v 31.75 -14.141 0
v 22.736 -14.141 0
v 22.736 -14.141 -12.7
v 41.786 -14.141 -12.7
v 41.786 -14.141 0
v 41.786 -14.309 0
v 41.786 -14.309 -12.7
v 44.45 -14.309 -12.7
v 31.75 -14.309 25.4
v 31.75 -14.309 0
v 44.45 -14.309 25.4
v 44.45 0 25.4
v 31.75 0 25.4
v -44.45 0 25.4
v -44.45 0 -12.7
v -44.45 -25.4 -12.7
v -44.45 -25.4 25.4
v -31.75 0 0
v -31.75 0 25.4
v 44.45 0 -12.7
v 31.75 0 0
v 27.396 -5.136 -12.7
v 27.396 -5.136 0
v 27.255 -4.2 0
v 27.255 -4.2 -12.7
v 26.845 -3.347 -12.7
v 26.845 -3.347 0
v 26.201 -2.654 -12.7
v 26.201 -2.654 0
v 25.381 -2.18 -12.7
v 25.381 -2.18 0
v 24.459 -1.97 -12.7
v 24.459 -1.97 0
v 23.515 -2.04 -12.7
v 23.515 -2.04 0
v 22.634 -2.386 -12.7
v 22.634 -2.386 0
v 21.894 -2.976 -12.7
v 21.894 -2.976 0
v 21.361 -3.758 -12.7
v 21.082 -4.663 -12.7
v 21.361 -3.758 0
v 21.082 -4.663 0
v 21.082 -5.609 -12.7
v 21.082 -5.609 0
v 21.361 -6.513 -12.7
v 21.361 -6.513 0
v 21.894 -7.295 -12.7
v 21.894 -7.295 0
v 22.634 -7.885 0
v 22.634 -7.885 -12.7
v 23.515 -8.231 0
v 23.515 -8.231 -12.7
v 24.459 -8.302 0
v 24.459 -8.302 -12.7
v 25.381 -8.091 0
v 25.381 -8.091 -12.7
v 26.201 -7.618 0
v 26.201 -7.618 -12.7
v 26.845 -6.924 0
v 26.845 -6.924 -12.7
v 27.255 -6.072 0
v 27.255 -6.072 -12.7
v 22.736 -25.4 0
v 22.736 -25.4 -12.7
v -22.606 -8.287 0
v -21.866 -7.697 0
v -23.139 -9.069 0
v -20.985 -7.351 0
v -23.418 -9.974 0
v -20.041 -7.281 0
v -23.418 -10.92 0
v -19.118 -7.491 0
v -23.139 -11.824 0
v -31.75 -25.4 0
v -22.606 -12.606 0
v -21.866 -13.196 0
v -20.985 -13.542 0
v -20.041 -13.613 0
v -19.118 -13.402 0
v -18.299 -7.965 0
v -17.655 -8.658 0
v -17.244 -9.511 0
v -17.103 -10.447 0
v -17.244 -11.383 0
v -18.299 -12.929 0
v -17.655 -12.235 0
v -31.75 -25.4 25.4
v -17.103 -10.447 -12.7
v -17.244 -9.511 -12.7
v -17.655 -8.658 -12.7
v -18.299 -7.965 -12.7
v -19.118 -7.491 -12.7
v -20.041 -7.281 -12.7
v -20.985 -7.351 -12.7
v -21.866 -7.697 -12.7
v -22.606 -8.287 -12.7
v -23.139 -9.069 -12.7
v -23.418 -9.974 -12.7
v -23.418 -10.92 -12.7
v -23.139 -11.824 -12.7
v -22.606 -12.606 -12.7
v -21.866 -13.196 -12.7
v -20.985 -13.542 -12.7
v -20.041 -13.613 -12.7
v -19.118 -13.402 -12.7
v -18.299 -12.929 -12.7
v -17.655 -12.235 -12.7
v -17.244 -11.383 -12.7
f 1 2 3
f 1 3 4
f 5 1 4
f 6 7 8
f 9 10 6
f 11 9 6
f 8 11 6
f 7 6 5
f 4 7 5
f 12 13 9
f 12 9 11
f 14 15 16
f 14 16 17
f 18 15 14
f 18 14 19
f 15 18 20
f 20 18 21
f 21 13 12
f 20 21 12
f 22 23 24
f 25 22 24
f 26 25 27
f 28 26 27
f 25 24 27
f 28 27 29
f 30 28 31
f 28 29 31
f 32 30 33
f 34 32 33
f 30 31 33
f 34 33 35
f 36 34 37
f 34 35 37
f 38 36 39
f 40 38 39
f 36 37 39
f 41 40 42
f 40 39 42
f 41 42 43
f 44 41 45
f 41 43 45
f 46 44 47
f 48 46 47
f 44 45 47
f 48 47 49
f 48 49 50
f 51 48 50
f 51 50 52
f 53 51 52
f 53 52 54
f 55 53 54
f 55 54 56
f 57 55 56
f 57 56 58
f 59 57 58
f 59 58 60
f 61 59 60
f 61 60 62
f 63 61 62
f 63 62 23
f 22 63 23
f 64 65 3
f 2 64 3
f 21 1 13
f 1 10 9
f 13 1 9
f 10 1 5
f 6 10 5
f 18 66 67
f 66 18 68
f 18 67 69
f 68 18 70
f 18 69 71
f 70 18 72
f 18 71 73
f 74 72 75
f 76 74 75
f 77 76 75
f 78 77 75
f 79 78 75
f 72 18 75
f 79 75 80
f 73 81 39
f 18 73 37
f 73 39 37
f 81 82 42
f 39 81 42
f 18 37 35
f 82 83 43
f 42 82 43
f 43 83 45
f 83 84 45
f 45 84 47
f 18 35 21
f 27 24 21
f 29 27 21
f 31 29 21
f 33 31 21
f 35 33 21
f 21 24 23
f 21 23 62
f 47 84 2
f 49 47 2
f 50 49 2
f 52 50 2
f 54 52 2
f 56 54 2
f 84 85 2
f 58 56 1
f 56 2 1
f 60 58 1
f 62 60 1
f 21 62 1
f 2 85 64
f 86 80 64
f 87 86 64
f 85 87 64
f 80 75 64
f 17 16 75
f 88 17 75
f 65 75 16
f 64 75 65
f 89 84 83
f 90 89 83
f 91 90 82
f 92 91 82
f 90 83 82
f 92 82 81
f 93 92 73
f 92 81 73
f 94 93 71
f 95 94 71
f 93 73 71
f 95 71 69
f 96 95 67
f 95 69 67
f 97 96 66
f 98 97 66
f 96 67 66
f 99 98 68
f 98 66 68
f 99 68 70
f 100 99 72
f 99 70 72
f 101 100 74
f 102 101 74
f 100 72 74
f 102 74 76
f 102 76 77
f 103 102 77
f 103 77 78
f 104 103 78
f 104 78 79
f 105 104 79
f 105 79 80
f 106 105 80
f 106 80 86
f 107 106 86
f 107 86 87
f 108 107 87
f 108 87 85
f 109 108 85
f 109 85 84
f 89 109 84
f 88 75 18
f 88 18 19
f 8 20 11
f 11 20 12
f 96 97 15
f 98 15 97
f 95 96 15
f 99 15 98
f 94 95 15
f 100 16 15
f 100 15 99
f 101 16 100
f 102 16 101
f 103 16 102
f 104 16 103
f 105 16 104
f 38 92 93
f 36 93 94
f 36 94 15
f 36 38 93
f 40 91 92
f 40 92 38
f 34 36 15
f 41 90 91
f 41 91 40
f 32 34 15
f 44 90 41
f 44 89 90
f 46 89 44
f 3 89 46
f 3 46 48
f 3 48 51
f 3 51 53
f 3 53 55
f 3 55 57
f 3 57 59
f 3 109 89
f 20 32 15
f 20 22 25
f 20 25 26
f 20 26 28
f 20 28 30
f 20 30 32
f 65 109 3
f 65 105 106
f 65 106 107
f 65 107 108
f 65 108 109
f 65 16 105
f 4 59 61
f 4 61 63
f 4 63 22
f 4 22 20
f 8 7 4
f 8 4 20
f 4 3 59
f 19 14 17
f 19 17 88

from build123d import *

# Parameters (mm, degrees)
F0_W      = 88.9
F0_H      = 50.8
F1_DEPTH  = 25.4
F2_W      = 63.5
F2_H      = 25.4
F3_DEPTH  = 25.401
F4_W      = 88.9
F4_H      = 12.7
F5_DEPTH  = 25.401
F8_W      = 19.05
F8_H      = 11.447972618
F9_DEPTH  = 12.701
F10_W     = 12.7
F10_H     = 11.090603964
F11_DEPTH = 38.101
F12_R     = 3.175
F14_DEPTH = 12.701
F13_R     = 3.175
F15_DEPTH = 12.701


# Not quite as in the source:
# - a feature of the source that left no trace in its solid (it failed there, or was rolled back) is left out


with BuildPart() as f1:
    # F0 (on Front) → F1 (new body)
    with BuildSketch(Plane.XZ):
        Rectangle(F0_W, F0_H)
    extrude(amount=F1_DEPTH)

    # F2 (on face) → F3 (cut, through all)
    with BuildSketch(Plane.XZ.offset(25.4)):
        with Locations((0, 12.7)):
            Rectangle(F2_W, F2_H)
    extrude(amount=-F3_DEPTH, mode=Mode.SUBTRACT)

    # F4 (on face) → F5 (cut, through all)
    with BuildSketch(Plane.XZ.offset(25.4)):
        with Locations((0, -19.05)):
            Rectangle(F4_W, F4_H)
    extrude(amount=-F5_DEPTH, mode=Mode.SUBTRACT)

    # F8 (on face) → F9 (cut, through all)
    with BuildSketch(Plane.XY):
        with Locations((32.2608303964, -19.8649899103)):
            Rectangle(F8_W, F8_H)
    extrude(amount=-F9_DEPTH, mode=Mode.SUBTRACT)

    # F10 (on face) → F11 (cut, through all)
    with BuildSketch(Plane.XY.offset(25.4)):
        with Locations((38.1, -19.854698018)):
            Rectangle(F10_W, F10_H)
    extrude(amount=-F11_DEPTH, mode=Mode.SUBTRACT)

    # F12 (on face) → F14 (cut, through all)
    with BuildSketch(Plane.XY):
        with Locations((24.2214165628, -5.1358360797)):
            Circle(F12_R)
    extrude(amount=-F14_DEPTH, mode=Mode.SUBTRACT)

    # F13 (on face) → F15 (cut, through all)
    with BuildSketch(Plane.XY):
        with Locations((-20.2783960849, -10.4468446225)):
            Circle(F13_R)
    extrude(amount=-F15_DEPTH, mode=Mode.SUBTRACT)


solid = f1.part
